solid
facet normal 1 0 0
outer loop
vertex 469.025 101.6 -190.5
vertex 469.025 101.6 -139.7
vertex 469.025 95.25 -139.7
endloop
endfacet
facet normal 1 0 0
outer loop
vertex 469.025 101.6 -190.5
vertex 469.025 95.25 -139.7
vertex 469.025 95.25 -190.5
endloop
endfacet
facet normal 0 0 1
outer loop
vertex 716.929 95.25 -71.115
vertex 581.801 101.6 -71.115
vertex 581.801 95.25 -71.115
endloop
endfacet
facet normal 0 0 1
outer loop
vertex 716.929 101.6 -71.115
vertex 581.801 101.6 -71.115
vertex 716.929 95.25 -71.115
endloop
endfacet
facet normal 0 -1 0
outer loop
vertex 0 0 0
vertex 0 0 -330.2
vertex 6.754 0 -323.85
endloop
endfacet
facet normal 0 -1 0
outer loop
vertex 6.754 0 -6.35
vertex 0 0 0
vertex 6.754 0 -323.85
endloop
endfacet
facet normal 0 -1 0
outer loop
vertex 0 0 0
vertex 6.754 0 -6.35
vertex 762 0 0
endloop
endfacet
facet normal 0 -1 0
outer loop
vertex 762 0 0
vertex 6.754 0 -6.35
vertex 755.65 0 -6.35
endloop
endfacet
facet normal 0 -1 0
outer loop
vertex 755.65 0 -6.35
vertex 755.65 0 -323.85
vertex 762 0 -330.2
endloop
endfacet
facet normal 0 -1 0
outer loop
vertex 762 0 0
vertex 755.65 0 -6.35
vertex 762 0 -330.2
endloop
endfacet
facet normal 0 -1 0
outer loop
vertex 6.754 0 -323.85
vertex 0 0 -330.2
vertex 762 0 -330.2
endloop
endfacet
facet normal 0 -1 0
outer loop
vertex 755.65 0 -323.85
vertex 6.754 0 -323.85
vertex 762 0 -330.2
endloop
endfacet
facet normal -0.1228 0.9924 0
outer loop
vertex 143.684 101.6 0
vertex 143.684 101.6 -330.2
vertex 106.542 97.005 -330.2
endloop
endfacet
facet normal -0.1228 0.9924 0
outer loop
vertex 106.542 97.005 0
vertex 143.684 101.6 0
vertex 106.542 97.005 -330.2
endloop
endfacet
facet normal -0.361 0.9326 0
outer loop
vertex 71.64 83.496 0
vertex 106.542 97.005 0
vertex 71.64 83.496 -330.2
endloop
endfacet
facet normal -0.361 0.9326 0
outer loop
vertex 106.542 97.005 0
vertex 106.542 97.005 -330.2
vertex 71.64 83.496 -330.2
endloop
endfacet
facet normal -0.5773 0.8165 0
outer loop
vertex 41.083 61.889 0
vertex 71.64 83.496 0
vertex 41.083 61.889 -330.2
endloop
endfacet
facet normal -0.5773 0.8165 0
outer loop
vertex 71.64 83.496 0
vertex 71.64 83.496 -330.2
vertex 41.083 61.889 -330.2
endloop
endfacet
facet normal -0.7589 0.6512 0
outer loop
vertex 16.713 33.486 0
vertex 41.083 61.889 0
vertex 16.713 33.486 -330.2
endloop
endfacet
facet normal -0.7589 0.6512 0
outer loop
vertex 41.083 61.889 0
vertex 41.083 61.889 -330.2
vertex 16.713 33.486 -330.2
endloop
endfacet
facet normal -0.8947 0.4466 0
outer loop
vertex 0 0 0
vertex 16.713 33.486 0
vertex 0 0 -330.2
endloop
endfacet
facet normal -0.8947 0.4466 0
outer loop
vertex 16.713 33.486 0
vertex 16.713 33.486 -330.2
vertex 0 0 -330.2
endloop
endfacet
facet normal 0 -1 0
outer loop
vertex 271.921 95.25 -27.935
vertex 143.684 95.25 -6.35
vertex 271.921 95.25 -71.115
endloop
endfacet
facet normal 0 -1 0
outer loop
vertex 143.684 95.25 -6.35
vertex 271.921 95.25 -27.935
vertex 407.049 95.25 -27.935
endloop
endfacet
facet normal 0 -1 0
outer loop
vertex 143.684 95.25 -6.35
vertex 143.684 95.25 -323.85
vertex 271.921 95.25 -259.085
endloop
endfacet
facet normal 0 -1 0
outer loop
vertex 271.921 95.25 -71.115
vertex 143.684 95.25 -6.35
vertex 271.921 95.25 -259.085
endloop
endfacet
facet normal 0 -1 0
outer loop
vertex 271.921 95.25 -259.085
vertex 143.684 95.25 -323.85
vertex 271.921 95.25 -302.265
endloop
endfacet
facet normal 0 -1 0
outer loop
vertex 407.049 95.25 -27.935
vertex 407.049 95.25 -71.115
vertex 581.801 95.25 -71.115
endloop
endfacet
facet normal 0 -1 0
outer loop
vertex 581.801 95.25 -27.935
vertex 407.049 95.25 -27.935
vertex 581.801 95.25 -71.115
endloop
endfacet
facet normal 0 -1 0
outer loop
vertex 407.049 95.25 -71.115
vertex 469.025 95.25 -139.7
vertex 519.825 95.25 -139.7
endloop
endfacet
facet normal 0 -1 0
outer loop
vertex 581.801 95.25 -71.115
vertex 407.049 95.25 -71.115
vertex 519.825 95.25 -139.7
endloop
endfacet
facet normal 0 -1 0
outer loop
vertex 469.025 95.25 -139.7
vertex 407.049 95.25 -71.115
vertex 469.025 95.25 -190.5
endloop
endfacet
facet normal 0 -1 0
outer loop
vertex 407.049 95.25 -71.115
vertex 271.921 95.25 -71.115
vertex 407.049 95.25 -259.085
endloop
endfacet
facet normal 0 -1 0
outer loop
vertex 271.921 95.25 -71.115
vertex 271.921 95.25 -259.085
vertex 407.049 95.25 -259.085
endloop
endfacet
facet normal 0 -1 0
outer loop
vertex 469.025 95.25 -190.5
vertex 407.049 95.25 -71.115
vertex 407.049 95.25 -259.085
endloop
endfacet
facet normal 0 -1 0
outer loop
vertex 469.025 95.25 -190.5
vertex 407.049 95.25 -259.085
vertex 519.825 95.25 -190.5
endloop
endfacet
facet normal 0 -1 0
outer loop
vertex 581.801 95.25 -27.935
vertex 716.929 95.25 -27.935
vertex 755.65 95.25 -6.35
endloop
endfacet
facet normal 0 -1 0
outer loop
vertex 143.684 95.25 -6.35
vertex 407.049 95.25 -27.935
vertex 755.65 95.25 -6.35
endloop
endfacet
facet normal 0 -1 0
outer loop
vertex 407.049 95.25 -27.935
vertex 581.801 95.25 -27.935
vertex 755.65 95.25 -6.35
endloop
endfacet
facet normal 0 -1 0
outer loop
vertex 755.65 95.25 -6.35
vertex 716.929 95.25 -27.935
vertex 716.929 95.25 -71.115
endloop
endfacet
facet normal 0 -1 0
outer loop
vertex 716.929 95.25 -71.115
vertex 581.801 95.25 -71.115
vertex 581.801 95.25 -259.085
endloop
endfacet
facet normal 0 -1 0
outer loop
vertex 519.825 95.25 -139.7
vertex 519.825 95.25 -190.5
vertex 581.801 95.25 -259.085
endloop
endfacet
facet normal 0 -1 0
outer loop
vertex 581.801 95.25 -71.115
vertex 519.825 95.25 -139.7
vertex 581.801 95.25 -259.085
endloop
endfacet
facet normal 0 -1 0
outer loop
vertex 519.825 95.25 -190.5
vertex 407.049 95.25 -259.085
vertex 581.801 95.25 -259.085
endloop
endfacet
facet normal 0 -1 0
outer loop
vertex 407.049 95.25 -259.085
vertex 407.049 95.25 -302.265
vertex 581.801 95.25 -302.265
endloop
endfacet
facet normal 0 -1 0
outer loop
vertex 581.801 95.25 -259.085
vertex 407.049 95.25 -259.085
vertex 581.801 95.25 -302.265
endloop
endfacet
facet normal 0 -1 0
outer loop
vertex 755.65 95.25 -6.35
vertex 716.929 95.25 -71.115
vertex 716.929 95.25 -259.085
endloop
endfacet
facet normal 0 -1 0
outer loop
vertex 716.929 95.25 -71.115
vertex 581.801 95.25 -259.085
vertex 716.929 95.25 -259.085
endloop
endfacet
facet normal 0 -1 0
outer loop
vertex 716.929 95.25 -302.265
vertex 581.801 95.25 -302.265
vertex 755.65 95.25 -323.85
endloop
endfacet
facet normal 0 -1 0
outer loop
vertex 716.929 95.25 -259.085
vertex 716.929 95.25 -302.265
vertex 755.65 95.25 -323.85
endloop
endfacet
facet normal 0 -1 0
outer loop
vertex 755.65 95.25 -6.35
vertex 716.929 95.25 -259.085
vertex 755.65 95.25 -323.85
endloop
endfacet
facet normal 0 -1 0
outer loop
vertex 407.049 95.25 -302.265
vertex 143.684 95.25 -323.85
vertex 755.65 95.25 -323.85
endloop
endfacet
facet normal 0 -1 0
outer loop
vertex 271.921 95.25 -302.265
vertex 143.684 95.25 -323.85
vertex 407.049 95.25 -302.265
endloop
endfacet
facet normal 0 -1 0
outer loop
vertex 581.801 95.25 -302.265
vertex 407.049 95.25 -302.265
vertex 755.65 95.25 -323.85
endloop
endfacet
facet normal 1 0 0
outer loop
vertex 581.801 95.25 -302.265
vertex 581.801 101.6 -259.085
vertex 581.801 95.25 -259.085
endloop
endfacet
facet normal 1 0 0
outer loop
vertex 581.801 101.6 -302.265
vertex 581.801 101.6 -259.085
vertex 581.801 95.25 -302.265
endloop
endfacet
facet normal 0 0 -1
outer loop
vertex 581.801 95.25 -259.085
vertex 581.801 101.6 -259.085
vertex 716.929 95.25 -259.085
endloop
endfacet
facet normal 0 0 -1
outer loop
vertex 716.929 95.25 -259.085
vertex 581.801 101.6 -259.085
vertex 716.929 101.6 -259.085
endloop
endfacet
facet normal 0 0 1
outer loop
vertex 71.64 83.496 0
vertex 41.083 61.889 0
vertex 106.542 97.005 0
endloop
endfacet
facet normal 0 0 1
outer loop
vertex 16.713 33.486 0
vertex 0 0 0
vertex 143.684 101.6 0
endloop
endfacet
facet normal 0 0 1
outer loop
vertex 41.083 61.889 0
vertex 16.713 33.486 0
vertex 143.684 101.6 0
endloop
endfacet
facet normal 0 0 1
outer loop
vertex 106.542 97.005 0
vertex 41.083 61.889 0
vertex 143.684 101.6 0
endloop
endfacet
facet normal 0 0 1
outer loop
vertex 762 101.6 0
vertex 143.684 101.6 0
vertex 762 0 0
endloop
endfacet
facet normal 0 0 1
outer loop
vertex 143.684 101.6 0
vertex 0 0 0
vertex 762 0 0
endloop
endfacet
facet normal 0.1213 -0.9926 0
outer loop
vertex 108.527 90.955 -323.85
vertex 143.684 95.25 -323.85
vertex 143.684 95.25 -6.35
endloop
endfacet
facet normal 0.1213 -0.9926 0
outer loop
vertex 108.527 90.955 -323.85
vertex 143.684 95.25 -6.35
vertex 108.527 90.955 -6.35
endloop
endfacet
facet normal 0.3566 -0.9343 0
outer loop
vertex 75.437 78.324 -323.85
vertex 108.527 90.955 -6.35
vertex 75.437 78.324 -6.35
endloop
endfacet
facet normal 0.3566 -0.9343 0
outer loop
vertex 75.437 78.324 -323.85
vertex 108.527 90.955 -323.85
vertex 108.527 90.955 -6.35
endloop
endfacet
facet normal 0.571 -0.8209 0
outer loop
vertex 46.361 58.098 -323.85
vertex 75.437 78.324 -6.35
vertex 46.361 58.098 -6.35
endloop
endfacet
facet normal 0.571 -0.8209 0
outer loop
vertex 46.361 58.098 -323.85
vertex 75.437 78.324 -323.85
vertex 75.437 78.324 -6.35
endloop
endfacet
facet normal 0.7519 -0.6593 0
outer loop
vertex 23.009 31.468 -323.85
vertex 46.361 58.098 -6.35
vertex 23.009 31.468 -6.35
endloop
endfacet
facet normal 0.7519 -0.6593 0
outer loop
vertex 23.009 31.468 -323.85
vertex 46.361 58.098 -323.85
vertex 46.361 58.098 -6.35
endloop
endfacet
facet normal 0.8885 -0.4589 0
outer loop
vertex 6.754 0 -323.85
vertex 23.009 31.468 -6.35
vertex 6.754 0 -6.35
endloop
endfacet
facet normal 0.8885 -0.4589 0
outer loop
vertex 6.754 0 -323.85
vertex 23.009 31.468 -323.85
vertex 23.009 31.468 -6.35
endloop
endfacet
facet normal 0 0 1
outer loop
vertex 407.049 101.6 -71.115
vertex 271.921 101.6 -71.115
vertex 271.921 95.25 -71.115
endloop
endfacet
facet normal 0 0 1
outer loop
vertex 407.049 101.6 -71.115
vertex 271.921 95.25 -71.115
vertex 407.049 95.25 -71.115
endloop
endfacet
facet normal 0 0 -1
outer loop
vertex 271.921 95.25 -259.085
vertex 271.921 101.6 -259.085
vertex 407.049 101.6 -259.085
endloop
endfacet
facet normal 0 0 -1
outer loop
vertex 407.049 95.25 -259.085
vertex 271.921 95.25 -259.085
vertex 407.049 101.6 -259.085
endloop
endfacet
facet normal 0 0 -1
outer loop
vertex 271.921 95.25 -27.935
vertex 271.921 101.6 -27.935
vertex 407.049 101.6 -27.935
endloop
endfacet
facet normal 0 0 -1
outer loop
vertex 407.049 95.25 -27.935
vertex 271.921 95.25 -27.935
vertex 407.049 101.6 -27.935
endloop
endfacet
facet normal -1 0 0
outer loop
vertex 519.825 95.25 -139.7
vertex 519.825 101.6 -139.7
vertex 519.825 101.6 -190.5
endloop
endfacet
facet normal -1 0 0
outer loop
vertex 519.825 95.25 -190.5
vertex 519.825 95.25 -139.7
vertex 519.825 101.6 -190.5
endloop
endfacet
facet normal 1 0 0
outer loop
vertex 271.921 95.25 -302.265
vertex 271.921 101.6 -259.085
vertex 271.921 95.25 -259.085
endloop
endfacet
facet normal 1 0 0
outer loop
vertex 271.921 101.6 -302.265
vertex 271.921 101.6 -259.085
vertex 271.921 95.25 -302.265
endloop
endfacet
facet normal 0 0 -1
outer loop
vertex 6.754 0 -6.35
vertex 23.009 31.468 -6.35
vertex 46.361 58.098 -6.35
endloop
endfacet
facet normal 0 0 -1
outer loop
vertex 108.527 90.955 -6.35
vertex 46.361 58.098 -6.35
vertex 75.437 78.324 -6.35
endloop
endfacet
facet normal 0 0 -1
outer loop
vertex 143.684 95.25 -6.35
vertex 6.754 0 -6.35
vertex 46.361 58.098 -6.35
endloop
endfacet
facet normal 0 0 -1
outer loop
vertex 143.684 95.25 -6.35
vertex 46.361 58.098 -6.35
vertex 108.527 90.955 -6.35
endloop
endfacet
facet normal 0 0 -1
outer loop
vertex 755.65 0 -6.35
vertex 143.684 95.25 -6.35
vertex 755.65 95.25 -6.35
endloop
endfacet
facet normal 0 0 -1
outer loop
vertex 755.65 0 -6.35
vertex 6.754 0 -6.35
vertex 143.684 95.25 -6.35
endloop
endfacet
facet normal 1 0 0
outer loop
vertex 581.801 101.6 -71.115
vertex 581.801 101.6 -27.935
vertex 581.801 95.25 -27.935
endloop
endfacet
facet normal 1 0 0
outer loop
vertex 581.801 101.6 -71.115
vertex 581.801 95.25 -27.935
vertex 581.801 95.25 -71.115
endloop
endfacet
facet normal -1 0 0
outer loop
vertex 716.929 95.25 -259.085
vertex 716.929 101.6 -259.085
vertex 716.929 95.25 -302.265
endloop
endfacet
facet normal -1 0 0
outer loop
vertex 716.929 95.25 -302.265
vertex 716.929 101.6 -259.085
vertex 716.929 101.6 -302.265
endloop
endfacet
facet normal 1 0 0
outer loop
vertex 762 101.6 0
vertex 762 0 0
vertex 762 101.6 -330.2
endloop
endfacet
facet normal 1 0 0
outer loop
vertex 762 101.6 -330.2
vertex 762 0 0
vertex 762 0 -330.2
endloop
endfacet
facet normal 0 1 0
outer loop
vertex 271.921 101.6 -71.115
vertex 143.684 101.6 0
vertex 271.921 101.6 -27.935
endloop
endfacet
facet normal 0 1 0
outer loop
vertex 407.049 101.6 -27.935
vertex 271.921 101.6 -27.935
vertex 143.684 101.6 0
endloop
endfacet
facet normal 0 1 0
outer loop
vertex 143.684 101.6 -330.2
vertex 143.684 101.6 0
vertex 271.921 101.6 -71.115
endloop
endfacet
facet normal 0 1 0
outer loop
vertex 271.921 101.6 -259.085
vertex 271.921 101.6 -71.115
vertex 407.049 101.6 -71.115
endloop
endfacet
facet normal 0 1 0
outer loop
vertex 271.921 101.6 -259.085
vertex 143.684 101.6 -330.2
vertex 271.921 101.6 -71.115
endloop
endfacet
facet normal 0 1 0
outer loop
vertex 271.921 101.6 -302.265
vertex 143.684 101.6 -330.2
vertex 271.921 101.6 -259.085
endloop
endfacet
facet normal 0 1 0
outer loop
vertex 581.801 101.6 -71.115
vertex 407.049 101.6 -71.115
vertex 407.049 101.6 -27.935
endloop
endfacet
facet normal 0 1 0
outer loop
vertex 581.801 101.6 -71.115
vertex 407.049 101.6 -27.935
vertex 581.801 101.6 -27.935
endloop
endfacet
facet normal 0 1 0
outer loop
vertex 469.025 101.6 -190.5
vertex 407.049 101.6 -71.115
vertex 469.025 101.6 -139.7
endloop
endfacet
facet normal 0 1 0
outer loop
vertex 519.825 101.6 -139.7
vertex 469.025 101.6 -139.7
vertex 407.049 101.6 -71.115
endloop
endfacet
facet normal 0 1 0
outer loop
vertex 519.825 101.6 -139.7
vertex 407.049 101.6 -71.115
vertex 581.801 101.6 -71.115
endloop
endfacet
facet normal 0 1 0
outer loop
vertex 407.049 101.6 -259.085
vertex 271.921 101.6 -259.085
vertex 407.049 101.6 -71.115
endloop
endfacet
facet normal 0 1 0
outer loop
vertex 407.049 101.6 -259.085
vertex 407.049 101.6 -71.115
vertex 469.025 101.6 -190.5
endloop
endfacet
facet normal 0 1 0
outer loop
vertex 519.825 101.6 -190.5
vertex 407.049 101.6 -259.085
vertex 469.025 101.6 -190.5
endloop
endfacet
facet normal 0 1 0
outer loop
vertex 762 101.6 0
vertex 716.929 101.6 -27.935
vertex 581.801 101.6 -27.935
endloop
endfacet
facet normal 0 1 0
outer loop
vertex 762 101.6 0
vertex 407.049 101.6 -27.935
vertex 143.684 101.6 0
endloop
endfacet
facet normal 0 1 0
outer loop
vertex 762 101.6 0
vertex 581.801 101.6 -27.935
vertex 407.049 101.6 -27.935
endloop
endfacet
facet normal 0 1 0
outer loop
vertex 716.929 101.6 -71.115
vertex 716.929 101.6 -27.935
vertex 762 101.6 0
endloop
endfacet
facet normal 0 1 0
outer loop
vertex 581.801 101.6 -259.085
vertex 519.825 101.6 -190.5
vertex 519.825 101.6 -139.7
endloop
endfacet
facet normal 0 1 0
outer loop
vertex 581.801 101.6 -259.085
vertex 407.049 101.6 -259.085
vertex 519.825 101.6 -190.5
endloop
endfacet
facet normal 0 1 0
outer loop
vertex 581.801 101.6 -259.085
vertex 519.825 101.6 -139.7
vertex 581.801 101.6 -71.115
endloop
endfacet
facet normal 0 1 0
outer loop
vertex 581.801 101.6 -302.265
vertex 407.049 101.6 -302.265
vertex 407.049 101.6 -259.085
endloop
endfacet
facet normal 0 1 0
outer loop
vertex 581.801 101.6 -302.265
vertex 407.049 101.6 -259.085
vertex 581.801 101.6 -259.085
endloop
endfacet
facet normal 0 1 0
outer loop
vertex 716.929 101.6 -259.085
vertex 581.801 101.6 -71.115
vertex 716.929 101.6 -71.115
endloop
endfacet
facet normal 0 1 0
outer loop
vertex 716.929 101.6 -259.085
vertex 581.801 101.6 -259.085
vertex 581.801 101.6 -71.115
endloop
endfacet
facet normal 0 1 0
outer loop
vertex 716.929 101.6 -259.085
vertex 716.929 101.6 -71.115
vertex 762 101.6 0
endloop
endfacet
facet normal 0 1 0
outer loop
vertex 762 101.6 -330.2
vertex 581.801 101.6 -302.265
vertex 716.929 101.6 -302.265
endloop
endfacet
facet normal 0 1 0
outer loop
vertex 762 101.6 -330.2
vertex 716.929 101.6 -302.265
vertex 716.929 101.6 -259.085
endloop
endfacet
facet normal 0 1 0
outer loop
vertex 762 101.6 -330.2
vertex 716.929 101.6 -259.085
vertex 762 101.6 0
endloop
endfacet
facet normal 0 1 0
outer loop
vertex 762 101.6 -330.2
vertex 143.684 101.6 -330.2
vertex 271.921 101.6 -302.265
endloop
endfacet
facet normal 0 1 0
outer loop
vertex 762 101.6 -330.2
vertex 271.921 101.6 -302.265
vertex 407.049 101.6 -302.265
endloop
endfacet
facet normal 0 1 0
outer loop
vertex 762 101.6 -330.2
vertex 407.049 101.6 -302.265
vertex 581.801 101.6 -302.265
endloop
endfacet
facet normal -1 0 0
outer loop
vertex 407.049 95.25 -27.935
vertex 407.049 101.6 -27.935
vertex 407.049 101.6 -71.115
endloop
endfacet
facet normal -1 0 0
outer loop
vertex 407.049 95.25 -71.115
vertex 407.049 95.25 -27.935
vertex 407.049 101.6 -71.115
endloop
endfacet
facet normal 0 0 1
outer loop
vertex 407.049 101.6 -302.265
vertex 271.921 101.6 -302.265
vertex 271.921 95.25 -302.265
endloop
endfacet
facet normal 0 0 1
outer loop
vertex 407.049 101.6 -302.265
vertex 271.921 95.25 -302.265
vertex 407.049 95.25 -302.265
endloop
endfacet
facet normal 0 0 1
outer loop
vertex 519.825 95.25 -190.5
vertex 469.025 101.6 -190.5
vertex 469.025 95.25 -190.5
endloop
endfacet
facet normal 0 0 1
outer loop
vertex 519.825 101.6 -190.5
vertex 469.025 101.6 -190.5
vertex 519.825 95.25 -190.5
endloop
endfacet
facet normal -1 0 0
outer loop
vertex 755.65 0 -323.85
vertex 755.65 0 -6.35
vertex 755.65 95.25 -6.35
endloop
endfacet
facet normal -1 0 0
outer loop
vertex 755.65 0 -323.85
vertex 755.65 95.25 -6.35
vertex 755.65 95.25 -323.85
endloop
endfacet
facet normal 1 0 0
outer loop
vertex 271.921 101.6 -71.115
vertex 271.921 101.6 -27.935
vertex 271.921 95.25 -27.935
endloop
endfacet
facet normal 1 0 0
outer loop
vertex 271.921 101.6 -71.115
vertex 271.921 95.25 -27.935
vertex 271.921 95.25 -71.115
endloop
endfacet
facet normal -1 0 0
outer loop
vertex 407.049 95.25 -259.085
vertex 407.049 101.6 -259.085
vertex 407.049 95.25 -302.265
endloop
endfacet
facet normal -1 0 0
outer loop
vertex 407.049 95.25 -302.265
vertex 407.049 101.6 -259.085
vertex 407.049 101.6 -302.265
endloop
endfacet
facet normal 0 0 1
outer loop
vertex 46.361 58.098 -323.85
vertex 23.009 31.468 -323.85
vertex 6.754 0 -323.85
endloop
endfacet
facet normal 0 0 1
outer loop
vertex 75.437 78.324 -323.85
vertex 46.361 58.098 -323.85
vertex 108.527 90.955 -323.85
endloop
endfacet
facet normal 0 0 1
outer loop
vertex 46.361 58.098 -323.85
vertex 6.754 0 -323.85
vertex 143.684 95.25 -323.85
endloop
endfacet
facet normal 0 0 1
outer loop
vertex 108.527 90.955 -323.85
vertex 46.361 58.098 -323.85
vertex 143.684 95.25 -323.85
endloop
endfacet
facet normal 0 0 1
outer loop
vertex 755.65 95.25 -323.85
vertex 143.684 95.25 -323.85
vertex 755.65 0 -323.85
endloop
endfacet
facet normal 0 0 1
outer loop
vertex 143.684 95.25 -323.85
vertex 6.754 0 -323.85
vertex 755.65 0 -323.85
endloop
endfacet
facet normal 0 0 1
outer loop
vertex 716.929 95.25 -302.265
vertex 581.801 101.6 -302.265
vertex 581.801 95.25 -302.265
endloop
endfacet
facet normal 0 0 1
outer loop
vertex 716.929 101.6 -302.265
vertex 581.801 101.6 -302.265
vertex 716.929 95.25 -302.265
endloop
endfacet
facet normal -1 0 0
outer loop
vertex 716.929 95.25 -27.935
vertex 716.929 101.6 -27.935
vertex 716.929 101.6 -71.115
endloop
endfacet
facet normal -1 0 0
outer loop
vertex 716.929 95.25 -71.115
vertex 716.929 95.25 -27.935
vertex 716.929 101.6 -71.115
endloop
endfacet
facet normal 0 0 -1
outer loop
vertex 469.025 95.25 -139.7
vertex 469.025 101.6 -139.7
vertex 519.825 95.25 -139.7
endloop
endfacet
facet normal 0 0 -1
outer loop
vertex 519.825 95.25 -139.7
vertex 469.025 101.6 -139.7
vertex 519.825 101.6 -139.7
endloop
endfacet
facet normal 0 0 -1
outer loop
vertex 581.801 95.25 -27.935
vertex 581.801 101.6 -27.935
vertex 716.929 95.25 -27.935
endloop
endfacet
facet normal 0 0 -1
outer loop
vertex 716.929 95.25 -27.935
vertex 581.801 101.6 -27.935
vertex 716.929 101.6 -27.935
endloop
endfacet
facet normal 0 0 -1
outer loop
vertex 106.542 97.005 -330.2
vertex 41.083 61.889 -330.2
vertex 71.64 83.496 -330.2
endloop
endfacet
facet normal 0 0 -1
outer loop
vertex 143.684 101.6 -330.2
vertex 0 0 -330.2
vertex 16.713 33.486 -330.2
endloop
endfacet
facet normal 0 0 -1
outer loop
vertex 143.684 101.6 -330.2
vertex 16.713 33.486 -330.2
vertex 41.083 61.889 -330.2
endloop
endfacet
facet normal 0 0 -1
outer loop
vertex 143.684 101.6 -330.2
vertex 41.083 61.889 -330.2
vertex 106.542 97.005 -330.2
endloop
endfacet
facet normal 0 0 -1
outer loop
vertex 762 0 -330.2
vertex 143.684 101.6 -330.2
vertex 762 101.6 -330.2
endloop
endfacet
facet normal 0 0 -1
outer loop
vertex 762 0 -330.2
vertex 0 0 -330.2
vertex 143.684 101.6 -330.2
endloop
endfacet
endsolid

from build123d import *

# Parameters (mm, degrees)
SKETCH1_W           = 762
SKETCH1_H           = 330.2
BOSS_EXTRUDE1_DEPTH = 101.6
FILLET1_R           = 152.4
SHELL1_T            = -6.35
SKETCH3_W           = 135.128
SKETCH3_H           = 43.18
SKETCH3_W_2         = 50.8
SKETCH3_H_2         = 50.8
CUT_EXTRUDE1_DEPTH  = 127.762


with BuildPart() as part:
    # Sketch1 → Boss-Extrude1 (new body)
    with BuildSketch(Plane(origin=(0, 0, 0), x_dir=(1, 0, 0), z_dir=(0, 1, 0))):
        with Locations((381, 165.1)):
            Rectangle(SKETCH1_W, SKETCH1_H)
    extrude(amount=BOSS_EXTRUDE1_DEPTH)

    # Fillet1
    # the kernel refuses this fillet: 152.4 mm, written as the material it takes off along each edge
    with BuildSketch(Plane(origin=(0, 101.6, -689.410244843), x_dir=(0, -1, 0), z_dir=(0, 0, 1))) as fillet1_piece_1:
        with BuildLine():
            CenterArc((152.4, 143.684097937), FILLET1_R, 180, 70.528779366)
            Line((0, 143.684097937), (-3.048, 143.684097937))
            Line((-3.048, 143.684097937), (-3.048, 0))
            Line((-3.048, 0), (0, -3.048))
            ThreePointArc((0, -3.048), (50.8, -3.048), (100.584, -2.873681959))
            Line((100.584, -2.873681959), (101.6, 0))
        make_face()
    extrude(amount=1048.620489686, mode=Mode.SUBTRACT)

    # Shell1
    shell1_openings = [part.faces().sort_by_distance(p)[0] for p in [
        (381, 0, -165.1),
    ]]
    offset(amount=SHELL1_T, openings=shell1_openings, kind=Kind.INTERSECTION)

    # Sketch3 → Cut-Extrude1 (cut)
    with BuildSketch(Plane(origin=(0, 101.6, 0), x_dir=(1, 0, 0), z_dir=(0, 1, 0))):
        with Locations((339.485069024, 49.525)):
            Rectangle(SKETCH3_W, SKETCH3_H)
        with Locations((649.365069024, 280.675)):
            Rectangle(SKETCH3_W, SKETCH3_H)
        with Locations((649.365069024, 49.525)):
            Rectangle(SKETCH3_W, SKETCH3_H)
        with Locations((339.485069024, 280.675)):
            Rectangle(SKETCH3_W, SKETCH3_H)
        with Locations((494.425069024, 165.1)):
            Rectangle(SKETCH3_W_2, SKETCH3_H_2)
    extrude(amount=-CUT_EXTRUDE1_DEPTH, mode=Mode.SUBTRACT)


solid = part.part
